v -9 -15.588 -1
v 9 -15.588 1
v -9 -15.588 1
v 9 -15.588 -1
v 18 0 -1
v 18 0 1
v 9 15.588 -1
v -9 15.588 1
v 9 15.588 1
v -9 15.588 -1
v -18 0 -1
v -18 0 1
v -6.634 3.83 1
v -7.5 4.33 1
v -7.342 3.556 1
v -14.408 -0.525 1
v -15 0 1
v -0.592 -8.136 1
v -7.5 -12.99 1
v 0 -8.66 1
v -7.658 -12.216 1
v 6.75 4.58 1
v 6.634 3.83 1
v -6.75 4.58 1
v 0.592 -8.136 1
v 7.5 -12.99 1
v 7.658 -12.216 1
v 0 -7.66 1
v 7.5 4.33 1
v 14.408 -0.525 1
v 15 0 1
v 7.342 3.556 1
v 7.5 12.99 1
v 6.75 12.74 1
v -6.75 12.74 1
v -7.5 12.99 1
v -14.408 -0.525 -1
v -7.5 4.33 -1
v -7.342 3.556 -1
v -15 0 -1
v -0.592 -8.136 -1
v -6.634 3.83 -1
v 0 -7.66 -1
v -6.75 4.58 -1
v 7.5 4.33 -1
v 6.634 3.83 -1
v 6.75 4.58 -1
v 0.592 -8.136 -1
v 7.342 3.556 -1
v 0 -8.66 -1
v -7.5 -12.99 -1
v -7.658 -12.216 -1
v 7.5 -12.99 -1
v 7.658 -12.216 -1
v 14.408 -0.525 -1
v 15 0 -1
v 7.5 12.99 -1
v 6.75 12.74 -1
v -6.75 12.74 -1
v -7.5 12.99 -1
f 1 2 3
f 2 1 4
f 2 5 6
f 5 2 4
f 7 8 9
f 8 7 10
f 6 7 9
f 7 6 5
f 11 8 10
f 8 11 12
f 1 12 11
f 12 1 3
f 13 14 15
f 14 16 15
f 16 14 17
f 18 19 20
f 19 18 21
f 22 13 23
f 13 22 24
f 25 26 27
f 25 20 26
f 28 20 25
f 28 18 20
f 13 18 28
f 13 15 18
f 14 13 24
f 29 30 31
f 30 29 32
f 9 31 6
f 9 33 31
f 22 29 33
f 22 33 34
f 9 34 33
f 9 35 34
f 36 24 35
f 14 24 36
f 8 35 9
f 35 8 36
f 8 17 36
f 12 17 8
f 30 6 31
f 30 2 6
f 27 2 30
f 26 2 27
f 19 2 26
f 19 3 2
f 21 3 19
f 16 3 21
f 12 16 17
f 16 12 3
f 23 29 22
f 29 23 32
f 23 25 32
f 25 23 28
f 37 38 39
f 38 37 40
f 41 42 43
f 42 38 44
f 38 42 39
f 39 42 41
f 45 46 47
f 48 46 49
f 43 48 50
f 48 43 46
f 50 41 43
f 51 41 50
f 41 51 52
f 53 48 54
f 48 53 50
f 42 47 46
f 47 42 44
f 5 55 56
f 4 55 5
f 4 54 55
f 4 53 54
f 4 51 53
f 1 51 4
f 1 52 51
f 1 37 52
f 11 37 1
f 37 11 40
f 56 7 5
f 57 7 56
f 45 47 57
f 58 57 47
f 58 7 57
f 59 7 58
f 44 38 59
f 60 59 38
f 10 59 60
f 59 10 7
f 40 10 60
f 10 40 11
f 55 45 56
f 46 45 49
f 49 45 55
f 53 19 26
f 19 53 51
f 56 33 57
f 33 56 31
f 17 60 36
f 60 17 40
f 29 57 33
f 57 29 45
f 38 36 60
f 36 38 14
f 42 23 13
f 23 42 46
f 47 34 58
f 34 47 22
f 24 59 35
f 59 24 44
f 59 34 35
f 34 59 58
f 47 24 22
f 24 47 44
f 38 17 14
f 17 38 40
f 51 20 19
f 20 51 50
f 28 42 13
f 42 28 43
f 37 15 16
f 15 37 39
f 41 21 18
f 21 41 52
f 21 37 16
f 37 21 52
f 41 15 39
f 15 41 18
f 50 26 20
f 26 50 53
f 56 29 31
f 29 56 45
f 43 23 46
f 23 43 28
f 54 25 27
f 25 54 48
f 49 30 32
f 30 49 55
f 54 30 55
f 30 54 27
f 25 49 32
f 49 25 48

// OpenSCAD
//Logo Influx


module logo_influxdata(k) {

  difference() //základní šestihran
  {  
     translate([0,0,-1])
     cylinder(h=2, r=k+0.2*k,$fn = 6); 
     translate([0,0,-2])
     cylinder(h=4, r=k,$fn = 6);
  }
 
  module obdelnik()
  { 
    difference() //základní obdélník
   {     
     x = (k*0.5)/cos(30);
           
   translate([0,x,0]) cube([k,x+1,2],center=true);
  translate([0,x,0]) cube([k-1.5,x-.5,3],center=true);     
   }
  }
 
  obdelnik();
 
  rotate(120)
  obdelnik();
 
  rotate(240)
  obdelnik();
}
 
logo_influxdata(15);
